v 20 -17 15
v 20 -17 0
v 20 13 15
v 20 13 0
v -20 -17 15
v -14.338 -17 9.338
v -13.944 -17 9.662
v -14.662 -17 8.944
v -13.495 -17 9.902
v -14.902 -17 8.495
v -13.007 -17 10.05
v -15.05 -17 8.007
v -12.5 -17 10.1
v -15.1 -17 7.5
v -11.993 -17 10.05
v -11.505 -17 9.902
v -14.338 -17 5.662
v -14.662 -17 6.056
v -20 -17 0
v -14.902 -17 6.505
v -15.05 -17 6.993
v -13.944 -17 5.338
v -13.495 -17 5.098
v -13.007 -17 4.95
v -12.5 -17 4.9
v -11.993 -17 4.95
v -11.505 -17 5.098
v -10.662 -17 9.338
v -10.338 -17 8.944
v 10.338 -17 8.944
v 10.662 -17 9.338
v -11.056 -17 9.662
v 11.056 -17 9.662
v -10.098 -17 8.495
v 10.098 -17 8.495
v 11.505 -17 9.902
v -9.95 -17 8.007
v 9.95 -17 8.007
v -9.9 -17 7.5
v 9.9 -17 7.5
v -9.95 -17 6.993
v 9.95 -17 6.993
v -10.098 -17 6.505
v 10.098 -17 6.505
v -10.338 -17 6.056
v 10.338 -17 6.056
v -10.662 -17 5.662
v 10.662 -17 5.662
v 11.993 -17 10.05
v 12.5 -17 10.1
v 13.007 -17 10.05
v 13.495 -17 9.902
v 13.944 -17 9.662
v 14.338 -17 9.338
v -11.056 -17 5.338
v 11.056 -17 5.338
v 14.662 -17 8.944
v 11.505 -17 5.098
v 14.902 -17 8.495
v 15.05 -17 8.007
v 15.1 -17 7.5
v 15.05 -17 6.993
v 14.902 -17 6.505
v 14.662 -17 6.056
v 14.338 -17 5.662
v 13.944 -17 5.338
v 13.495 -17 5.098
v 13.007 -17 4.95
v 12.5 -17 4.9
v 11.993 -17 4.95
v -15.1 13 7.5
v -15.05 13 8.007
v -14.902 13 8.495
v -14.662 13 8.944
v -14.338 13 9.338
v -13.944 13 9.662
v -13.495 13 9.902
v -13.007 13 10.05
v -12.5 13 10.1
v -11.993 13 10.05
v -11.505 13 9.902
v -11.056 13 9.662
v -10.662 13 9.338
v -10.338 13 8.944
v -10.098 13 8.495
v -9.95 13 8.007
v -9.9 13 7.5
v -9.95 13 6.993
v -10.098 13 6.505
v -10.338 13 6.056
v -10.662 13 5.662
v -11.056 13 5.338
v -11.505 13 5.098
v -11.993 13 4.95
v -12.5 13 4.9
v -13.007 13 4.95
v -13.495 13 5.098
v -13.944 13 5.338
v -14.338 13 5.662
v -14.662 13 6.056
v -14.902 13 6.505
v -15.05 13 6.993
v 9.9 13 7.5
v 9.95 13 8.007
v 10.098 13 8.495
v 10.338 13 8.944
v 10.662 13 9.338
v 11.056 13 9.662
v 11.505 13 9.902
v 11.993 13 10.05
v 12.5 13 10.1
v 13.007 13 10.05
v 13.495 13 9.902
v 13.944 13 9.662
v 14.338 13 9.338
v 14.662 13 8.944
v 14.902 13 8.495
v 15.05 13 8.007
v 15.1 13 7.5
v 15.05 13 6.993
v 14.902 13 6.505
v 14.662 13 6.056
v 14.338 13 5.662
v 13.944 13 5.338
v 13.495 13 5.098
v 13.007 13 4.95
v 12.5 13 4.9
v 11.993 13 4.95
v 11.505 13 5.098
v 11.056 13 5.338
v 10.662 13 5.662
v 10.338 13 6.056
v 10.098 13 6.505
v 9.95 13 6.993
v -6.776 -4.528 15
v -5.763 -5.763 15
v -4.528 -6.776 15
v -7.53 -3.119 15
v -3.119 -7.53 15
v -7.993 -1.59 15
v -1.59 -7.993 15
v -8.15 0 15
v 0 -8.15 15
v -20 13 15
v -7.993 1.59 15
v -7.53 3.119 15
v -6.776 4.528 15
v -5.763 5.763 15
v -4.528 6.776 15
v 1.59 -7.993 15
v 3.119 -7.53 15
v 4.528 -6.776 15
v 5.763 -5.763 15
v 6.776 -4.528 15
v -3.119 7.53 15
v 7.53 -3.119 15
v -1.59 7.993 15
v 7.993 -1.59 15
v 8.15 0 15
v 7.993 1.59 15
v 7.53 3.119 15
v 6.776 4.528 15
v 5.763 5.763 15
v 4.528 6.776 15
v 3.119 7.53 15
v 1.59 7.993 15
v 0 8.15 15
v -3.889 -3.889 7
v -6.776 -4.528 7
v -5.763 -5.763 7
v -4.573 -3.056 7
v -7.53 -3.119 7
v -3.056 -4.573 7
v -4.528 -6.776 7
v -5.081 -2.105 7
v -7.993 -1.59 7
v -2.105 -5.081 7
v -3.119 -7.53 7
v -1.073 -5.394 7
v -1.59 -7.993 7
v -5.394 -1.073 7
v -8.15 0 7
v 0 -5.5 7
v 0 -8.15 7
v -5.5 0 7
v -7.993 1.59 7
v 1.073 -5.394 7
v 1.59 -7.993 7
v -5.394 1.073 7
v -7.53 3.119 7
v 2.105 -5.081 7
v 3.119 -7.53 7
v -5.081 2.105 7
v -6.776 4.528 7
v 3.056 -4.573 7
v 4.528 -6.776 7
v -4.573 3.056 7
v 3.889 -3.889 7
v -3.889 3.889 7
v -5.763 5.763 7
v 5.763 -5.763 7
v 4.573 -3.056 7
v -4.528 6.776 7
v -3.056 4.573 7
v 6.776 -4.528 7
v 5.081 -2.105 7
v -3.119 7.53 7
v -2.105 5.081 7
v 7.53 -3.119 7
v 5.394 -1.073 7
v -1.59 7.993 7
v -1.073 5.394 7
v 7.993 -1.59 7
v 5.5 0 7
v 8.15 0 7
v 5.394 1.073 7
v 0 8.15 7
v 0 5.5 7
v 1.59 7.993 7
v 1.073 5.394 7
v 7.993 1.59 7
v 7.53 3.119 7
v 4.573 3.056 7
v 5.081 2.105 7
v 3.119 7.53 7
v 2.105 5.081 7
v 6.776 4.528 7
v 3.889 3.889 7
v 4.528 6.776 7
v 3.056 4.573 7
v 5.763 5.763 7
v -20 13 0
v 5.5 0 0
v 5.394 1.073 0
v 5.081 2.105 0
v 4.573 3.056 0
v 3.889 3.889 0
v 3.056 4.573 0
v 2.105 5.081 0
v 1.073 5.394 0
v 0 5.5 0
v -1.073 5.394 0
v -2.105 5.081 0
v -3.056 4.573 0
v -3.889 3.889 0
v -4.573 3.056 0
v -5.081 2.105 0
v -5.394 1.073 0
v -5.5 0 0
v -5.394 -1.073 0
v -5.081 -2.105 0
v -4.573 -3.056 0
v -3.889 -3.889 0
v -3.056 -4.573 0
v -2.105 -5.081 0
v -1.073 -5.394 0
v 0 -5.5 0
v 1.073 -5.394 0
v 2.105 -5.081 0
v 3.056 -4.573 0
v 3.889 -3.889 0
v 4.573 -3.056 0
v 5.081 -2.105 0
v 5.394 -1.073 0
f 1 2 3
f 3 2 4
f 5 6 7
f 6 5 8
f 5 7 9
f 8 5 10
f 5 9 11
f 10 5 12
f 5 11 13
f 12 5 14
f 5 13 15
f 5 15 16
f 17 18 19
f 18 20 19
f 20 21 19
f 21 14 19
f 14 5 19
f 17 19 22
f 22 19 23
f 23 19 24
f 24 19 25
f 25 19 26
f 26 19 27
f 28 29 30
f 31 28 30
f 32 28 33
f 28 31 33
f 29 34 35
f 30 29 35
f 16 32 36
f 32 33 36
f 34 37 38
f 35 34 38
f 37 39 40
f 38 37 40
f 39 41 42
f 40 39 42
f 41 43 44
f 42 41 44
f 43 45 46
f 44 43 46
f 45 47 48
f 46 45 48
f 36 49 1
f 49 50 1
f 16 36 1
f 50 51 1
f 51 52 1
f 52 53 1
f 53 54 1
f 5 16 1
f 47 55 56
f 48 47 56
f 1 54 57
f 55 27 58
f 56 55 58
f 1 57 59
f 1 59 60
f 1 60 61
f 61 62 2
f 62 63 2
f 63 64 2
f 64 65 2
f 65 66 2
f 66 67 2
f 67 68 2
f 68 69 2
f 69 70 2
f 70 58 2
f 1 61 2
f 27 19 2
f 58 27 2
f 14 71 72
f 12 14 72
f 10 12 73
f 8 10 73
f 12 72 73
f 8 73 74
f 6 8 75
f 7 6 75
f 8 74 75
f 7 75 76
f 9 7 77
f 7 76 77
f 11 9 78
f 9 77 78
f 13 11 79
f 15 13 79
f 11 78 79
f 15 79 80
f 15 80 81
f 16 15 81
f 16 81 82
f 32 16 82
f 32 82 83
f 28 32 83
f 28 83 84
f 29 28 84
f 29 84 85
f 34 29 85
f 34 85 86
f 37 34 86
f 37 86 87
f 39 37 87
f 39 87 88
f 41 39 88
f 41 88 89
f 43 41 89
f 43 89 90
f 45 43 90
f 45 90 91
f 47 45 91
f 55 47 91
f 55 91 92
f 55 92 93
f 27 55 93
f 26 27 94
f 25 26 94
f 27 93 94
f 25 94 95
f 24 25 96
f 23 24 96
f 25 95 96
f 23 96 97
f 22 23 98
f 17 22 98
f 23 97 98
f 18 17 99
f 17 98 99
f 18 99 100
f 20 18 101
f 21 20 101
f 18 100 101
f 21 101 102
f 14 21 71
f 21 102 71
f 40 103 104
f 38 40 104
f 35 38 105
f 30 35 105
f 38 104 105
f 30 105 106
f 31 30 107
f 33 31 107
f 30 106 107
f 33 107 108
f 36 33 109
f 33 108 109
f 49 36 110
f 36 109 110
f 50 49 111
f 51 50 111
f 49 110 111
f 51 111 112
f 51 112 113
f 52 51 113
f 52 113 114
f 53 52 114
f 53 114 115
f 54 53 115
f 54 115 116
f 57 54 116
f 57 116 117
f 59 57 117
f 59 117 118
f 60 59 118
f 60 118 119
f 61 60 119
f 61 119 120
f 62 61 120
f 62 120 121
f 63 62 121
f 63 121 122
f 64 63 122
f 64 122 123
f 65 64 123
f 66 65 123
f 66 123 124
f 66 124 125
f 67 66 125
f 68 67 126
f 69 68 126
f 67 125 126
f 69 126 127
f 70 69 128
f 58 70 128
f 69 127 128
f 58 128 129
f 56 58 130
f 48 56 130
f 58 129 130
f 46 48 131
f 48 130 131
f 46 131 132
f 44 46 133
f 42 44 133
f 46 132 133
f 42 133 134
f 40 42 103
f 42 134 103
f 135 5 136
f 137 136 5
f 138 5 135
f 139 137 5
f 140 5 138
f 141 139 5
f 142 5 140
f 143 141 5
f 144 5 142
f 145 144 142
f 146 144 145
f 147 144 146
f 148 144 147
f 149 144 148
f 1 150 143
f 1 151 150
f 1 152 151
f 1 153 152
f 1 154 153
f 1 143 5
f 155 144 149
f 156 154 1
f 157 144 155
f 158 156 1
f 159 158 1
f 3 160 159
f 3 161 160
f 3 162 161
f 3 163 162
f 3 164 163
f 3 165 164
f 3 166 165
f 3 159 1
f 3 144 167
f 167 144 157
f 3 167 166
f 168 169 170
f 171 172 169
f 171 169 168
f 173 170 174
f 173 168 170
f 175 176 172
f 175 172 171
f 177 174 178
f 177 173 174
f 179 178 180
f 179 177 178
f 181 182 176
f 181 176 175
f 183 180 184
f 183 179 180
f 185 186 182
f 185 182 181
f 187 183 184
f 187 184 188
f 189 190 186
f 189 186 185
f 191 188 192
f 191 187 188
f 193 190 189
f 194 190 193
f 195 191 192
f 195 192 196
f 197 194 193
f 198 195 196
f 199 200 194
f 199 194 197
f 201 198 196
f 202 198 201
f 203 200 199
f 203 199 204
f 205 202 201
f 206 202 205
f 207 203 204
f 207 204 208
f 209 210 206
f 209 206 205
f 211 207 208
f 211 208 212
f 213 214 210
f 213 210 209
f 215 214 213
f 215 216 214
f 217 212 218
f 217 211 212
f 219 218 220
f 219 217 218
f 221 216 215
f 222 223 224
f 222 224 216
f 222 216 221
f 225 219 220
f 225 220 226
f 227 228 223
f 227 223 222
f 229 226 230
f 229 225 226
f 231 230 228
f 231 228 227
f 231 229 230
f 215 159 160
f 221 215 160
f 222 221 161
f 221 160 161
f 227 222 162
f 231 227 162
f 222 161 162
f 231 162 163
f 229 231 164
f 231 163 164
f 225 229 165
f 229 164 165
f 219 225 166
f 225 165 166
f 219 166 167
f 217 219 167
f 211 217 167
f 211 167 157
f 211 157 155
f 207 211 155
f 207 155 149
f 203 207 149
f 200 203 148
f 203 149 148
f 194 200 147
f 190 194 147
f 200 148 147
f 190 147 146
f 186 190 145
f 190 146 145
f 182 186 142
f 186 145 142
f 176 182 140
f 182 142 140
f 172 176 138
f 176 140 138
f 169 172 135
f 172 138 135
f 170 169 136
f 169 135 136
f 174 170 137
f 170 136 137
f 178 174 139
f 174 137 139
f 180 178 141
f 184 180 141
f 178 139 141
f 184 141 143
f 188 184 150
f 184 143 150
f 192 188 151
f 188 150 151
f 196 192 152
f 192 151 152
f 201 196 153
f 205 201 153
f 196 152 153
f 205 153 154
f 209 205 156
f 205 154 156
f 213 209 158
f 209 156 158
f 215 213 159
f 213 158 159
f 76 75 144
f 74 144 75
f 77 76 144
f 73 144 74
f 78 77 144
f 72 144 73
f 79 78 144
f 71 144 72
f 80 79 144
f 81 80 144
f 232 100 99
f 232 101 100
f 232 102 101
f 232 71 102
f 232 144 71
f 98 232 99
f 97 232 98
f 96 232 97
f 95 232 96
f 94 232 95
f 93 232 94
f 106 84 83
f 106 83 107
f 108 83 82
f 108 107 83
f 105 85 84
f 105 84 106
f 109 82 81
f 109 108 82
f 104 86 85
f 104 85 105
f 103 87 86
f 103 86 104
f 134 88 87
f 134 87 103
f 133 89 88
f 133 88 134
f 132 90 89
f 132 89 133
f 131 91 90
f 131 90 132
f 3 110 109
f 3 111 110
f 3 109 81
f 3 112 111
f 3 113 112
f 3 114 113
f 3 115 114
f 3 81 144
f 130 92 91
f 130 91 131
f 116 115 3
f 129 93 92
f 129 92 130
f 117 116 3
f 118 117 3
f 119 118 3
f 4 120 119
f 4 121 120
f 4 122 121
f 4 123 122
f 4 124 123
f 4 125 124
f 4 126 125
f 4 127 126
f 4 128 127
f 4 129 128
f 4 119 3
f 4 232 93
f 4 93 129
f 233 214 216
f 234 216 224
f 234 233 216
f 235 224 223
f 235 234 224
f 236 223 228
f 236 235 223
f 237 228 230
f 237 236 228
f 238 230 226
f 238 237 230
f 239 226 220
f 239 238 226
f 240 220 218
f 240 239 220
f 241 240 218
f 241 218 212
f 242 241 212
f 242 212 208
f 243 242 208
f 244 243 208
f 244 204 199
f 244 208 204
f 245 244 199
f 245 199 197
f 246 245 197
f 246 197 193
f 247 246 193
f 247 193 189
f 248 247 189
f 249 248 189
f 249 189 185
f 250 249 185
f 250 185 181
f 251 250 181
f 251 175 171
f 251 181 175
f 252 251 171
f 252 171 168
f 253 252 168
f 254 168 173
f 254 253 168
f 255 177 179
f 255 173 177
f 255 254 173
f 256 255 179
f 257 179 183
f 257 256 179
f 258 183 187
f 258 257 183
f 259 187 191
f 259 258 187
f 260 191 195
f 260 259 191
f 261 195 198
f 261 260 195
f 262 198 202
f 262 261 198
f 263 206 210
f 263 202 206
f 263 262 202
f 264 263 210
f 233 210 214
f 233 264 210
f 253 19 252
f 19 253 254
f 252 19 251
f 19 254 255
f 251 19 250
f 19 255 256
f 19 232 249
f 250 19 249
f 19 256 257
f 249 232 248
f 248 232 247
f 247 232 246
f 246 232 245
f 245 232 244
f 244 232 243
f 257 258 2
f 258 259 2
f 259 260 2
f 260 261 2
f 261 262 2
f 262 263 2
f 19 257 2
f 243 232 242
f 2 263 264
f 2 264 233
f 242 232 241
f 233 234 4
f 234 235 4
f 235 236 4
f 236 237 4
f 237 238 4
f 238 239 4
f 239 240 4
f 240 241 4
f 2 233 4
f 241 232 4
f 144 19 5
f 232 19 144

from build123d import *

# Parameters (mm, degrees)
SKETCH_W        = 40
SKETCH_H        = 30
SKETCH_R        = 5.5
PAD_DEPTH       = 15
SKETCH001_R     = 8.15
POCKET_DEPTH    = 8
SKETCH002_R     = 2.6
POCKET001_DEPTH = 30.001


with BuildPart() as part:
    # Sketch → Pad (new body)
    with BuildSketch(Plane.XY):
        with Locations((0, -2)):
            Rectangle(SKETCH_W, SKETCH_H)
        Circle(SKETCH_R, mode=Mode.SUBTRACT)
    extrude(amount=PAD_DEPTH)

    # Sketch001 (on Face7 of Pad) → Pocket (cut)
    with BuildSketch(Plane.XY.offset(15)):
        Circle(SKETCH001_R)
    extrude(amount=-POCKET_DEPTH, mode=Mode.SUBTRACT)

    # Sketch002 (on Face1 of Pocket) → Pocket001 (cut, through all)
    with BuildSketch(Plane(origin=(0, 13, 0), x_dir=(-1, 0, 0), z_dir=(0, 1, 0))):
        with Locations((-12.5, 7.5)):
            Circle(SKETCH002_R)
        with Locations((12.5, 7.5)):
            Circle(SKETCH002_R)
    extrude(amount=-POCKET001_DEPTH, mode=Mode.SUBTRACT)


solid = part.part
